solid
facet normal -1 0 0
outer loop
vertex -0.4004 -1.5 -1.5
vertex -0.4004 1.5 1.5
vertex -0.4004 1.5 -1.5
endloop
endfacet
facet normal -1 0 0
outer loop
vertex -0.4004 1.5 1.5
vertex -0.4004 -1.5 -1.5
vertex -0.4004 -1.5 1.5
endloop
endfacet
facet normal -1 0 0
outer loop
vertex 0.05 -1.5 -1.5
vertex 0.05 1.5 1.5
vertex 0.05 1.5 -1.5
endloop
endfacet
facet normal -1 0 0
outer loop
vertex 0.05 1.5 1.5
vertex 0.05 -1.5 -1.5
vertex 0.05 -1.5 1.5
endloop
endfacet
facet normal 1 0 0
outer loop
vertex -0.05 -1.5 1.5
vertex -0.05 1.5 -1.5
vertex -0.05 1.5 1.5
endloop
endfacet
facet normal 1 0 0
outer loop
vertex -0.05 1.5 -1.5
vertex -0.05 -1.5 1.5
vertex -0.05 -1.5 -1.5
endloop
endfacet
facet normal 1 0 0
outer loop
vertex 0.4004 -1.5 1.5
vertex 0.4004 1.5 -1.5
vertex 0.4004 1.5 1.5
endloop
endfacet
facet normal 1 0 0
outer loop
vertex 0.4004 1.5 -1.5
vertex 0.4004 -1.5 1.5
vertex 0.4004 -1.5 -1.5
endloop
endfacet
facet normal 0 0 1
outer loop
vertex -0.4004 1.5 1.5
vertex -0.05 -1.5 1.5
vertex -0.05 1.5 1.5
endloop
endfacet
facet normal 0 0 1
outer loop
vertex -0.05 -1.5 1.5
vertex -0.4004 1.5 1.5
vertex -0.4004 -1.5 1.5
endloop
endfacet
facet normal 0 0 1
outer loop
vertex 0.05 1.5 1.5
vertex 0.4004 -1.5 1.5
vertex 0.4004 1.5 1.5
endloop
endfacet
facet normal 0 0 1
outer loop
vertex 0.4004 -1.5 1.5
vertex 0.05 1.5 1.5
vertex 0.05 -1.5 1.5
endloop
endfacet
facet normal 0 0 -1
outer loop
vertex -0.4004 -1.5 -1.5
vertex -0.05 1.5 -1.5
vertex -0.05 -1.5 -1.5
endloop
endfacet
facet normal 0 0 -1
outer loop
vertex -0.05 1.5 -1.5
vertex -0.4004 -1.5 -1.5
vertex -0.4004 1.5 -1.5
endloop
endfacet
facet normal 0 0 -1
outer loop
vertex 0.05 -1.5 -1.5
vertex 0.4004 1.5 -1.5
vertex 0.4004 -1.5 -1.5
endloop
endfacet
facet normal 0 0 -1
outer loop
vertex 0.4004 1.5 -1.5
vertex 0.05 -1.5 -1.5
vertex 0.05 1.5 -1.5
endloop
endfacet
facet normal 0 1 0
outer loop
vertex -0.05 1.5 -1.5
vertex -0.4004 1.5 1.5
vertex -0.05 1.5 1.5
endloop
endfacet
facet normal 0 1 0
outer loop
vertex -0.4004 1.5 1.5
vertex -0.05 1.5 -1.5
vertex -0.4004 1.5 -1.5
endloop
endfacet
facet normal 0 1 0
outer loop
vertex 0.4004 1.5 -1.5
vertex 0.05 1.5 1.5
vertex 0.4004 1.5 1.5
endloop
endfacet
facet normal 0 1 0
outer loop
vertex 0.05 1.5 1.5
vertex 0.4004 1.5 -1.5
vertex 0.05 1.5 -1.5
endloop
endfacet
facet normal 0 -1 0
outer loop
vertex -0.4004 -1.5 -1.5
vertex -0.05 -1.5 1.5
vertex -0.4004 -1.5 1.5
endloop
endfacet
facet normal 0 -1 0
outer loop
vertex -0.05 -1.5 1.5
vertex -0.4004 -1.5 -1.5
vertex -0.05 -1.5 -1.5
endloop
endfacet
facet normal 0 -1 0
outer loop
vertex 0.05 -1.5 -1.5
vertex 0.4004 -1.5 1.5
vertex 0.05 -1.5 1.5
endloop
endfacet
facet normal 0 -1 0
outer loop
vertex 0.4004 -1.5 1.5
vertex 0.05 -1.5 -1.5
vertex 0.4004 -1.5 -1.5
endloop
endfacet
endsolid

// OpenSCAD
// file: config.scad
// all measures in mm

/*
 * Base material to cut from
 */
material_x = 510;
material_y = 370;
material_z = 3;

/*
 * Shark model measures
 */
shark_length = 100;

/*
 * Cuboid measures (inside)
 */
cuboid_x = shark_length / 2;
cuboid_y = cuboid_x+20;
cuboid_z = cuboid_x+40;

/*
 * Save some calculations
 */
cuboid_x_2 = cuboid_x / 2;
cuboid_y_2 = cuboid_y / 2;
cuboid_z_2 = cuboid_z / 2;
material_z_2 = material_z / 2;

/*
 * Nose properties
 */
// the number
nose_count = 3;
// width of a nose relative to length of the corresponding edge
relative_nose_length = 0.1;

/*
 * Rendering and projection properties
 */
// how far apart from on another to project the parts
projection_spacing = 1;
// rendering quality (face number)
$fn = 50;
// main file
include <config.scad>;

/**
 * Generates configured number of noses
 * centered, along X axis, to normalized total length of 1
 */
module nose_positive()
{
    begin_x = -0.5;
    delta_x = (1-relative_nose_length) / (nose_count-1);
    for (i=[0:nose_count-1])
    {
        translate([
            begin_x + i*delta_x,
            -material_z/2,
            -material_z/2
            ])
        cube([
            relative_nose_length,
            material_z,
            material_z
            ]);
    }
}

/**
 * Generates the counterpart to nose_positive()
 */
module nose_negative()
{
    // subtract nose_positive() from centered cuboid
    difference()
    {
        translate([
            -0.5,
            -material_z/2,
            -material_z/2
            ])
        cube([
            1,
            material_z,
            material_z
            ]);
        // a little overscale to get rid of rendering artifacts
        scale([
            1.001,
            1.001,
            1.001
            ])
        nose_positive();
    }
}

nose_negative();
